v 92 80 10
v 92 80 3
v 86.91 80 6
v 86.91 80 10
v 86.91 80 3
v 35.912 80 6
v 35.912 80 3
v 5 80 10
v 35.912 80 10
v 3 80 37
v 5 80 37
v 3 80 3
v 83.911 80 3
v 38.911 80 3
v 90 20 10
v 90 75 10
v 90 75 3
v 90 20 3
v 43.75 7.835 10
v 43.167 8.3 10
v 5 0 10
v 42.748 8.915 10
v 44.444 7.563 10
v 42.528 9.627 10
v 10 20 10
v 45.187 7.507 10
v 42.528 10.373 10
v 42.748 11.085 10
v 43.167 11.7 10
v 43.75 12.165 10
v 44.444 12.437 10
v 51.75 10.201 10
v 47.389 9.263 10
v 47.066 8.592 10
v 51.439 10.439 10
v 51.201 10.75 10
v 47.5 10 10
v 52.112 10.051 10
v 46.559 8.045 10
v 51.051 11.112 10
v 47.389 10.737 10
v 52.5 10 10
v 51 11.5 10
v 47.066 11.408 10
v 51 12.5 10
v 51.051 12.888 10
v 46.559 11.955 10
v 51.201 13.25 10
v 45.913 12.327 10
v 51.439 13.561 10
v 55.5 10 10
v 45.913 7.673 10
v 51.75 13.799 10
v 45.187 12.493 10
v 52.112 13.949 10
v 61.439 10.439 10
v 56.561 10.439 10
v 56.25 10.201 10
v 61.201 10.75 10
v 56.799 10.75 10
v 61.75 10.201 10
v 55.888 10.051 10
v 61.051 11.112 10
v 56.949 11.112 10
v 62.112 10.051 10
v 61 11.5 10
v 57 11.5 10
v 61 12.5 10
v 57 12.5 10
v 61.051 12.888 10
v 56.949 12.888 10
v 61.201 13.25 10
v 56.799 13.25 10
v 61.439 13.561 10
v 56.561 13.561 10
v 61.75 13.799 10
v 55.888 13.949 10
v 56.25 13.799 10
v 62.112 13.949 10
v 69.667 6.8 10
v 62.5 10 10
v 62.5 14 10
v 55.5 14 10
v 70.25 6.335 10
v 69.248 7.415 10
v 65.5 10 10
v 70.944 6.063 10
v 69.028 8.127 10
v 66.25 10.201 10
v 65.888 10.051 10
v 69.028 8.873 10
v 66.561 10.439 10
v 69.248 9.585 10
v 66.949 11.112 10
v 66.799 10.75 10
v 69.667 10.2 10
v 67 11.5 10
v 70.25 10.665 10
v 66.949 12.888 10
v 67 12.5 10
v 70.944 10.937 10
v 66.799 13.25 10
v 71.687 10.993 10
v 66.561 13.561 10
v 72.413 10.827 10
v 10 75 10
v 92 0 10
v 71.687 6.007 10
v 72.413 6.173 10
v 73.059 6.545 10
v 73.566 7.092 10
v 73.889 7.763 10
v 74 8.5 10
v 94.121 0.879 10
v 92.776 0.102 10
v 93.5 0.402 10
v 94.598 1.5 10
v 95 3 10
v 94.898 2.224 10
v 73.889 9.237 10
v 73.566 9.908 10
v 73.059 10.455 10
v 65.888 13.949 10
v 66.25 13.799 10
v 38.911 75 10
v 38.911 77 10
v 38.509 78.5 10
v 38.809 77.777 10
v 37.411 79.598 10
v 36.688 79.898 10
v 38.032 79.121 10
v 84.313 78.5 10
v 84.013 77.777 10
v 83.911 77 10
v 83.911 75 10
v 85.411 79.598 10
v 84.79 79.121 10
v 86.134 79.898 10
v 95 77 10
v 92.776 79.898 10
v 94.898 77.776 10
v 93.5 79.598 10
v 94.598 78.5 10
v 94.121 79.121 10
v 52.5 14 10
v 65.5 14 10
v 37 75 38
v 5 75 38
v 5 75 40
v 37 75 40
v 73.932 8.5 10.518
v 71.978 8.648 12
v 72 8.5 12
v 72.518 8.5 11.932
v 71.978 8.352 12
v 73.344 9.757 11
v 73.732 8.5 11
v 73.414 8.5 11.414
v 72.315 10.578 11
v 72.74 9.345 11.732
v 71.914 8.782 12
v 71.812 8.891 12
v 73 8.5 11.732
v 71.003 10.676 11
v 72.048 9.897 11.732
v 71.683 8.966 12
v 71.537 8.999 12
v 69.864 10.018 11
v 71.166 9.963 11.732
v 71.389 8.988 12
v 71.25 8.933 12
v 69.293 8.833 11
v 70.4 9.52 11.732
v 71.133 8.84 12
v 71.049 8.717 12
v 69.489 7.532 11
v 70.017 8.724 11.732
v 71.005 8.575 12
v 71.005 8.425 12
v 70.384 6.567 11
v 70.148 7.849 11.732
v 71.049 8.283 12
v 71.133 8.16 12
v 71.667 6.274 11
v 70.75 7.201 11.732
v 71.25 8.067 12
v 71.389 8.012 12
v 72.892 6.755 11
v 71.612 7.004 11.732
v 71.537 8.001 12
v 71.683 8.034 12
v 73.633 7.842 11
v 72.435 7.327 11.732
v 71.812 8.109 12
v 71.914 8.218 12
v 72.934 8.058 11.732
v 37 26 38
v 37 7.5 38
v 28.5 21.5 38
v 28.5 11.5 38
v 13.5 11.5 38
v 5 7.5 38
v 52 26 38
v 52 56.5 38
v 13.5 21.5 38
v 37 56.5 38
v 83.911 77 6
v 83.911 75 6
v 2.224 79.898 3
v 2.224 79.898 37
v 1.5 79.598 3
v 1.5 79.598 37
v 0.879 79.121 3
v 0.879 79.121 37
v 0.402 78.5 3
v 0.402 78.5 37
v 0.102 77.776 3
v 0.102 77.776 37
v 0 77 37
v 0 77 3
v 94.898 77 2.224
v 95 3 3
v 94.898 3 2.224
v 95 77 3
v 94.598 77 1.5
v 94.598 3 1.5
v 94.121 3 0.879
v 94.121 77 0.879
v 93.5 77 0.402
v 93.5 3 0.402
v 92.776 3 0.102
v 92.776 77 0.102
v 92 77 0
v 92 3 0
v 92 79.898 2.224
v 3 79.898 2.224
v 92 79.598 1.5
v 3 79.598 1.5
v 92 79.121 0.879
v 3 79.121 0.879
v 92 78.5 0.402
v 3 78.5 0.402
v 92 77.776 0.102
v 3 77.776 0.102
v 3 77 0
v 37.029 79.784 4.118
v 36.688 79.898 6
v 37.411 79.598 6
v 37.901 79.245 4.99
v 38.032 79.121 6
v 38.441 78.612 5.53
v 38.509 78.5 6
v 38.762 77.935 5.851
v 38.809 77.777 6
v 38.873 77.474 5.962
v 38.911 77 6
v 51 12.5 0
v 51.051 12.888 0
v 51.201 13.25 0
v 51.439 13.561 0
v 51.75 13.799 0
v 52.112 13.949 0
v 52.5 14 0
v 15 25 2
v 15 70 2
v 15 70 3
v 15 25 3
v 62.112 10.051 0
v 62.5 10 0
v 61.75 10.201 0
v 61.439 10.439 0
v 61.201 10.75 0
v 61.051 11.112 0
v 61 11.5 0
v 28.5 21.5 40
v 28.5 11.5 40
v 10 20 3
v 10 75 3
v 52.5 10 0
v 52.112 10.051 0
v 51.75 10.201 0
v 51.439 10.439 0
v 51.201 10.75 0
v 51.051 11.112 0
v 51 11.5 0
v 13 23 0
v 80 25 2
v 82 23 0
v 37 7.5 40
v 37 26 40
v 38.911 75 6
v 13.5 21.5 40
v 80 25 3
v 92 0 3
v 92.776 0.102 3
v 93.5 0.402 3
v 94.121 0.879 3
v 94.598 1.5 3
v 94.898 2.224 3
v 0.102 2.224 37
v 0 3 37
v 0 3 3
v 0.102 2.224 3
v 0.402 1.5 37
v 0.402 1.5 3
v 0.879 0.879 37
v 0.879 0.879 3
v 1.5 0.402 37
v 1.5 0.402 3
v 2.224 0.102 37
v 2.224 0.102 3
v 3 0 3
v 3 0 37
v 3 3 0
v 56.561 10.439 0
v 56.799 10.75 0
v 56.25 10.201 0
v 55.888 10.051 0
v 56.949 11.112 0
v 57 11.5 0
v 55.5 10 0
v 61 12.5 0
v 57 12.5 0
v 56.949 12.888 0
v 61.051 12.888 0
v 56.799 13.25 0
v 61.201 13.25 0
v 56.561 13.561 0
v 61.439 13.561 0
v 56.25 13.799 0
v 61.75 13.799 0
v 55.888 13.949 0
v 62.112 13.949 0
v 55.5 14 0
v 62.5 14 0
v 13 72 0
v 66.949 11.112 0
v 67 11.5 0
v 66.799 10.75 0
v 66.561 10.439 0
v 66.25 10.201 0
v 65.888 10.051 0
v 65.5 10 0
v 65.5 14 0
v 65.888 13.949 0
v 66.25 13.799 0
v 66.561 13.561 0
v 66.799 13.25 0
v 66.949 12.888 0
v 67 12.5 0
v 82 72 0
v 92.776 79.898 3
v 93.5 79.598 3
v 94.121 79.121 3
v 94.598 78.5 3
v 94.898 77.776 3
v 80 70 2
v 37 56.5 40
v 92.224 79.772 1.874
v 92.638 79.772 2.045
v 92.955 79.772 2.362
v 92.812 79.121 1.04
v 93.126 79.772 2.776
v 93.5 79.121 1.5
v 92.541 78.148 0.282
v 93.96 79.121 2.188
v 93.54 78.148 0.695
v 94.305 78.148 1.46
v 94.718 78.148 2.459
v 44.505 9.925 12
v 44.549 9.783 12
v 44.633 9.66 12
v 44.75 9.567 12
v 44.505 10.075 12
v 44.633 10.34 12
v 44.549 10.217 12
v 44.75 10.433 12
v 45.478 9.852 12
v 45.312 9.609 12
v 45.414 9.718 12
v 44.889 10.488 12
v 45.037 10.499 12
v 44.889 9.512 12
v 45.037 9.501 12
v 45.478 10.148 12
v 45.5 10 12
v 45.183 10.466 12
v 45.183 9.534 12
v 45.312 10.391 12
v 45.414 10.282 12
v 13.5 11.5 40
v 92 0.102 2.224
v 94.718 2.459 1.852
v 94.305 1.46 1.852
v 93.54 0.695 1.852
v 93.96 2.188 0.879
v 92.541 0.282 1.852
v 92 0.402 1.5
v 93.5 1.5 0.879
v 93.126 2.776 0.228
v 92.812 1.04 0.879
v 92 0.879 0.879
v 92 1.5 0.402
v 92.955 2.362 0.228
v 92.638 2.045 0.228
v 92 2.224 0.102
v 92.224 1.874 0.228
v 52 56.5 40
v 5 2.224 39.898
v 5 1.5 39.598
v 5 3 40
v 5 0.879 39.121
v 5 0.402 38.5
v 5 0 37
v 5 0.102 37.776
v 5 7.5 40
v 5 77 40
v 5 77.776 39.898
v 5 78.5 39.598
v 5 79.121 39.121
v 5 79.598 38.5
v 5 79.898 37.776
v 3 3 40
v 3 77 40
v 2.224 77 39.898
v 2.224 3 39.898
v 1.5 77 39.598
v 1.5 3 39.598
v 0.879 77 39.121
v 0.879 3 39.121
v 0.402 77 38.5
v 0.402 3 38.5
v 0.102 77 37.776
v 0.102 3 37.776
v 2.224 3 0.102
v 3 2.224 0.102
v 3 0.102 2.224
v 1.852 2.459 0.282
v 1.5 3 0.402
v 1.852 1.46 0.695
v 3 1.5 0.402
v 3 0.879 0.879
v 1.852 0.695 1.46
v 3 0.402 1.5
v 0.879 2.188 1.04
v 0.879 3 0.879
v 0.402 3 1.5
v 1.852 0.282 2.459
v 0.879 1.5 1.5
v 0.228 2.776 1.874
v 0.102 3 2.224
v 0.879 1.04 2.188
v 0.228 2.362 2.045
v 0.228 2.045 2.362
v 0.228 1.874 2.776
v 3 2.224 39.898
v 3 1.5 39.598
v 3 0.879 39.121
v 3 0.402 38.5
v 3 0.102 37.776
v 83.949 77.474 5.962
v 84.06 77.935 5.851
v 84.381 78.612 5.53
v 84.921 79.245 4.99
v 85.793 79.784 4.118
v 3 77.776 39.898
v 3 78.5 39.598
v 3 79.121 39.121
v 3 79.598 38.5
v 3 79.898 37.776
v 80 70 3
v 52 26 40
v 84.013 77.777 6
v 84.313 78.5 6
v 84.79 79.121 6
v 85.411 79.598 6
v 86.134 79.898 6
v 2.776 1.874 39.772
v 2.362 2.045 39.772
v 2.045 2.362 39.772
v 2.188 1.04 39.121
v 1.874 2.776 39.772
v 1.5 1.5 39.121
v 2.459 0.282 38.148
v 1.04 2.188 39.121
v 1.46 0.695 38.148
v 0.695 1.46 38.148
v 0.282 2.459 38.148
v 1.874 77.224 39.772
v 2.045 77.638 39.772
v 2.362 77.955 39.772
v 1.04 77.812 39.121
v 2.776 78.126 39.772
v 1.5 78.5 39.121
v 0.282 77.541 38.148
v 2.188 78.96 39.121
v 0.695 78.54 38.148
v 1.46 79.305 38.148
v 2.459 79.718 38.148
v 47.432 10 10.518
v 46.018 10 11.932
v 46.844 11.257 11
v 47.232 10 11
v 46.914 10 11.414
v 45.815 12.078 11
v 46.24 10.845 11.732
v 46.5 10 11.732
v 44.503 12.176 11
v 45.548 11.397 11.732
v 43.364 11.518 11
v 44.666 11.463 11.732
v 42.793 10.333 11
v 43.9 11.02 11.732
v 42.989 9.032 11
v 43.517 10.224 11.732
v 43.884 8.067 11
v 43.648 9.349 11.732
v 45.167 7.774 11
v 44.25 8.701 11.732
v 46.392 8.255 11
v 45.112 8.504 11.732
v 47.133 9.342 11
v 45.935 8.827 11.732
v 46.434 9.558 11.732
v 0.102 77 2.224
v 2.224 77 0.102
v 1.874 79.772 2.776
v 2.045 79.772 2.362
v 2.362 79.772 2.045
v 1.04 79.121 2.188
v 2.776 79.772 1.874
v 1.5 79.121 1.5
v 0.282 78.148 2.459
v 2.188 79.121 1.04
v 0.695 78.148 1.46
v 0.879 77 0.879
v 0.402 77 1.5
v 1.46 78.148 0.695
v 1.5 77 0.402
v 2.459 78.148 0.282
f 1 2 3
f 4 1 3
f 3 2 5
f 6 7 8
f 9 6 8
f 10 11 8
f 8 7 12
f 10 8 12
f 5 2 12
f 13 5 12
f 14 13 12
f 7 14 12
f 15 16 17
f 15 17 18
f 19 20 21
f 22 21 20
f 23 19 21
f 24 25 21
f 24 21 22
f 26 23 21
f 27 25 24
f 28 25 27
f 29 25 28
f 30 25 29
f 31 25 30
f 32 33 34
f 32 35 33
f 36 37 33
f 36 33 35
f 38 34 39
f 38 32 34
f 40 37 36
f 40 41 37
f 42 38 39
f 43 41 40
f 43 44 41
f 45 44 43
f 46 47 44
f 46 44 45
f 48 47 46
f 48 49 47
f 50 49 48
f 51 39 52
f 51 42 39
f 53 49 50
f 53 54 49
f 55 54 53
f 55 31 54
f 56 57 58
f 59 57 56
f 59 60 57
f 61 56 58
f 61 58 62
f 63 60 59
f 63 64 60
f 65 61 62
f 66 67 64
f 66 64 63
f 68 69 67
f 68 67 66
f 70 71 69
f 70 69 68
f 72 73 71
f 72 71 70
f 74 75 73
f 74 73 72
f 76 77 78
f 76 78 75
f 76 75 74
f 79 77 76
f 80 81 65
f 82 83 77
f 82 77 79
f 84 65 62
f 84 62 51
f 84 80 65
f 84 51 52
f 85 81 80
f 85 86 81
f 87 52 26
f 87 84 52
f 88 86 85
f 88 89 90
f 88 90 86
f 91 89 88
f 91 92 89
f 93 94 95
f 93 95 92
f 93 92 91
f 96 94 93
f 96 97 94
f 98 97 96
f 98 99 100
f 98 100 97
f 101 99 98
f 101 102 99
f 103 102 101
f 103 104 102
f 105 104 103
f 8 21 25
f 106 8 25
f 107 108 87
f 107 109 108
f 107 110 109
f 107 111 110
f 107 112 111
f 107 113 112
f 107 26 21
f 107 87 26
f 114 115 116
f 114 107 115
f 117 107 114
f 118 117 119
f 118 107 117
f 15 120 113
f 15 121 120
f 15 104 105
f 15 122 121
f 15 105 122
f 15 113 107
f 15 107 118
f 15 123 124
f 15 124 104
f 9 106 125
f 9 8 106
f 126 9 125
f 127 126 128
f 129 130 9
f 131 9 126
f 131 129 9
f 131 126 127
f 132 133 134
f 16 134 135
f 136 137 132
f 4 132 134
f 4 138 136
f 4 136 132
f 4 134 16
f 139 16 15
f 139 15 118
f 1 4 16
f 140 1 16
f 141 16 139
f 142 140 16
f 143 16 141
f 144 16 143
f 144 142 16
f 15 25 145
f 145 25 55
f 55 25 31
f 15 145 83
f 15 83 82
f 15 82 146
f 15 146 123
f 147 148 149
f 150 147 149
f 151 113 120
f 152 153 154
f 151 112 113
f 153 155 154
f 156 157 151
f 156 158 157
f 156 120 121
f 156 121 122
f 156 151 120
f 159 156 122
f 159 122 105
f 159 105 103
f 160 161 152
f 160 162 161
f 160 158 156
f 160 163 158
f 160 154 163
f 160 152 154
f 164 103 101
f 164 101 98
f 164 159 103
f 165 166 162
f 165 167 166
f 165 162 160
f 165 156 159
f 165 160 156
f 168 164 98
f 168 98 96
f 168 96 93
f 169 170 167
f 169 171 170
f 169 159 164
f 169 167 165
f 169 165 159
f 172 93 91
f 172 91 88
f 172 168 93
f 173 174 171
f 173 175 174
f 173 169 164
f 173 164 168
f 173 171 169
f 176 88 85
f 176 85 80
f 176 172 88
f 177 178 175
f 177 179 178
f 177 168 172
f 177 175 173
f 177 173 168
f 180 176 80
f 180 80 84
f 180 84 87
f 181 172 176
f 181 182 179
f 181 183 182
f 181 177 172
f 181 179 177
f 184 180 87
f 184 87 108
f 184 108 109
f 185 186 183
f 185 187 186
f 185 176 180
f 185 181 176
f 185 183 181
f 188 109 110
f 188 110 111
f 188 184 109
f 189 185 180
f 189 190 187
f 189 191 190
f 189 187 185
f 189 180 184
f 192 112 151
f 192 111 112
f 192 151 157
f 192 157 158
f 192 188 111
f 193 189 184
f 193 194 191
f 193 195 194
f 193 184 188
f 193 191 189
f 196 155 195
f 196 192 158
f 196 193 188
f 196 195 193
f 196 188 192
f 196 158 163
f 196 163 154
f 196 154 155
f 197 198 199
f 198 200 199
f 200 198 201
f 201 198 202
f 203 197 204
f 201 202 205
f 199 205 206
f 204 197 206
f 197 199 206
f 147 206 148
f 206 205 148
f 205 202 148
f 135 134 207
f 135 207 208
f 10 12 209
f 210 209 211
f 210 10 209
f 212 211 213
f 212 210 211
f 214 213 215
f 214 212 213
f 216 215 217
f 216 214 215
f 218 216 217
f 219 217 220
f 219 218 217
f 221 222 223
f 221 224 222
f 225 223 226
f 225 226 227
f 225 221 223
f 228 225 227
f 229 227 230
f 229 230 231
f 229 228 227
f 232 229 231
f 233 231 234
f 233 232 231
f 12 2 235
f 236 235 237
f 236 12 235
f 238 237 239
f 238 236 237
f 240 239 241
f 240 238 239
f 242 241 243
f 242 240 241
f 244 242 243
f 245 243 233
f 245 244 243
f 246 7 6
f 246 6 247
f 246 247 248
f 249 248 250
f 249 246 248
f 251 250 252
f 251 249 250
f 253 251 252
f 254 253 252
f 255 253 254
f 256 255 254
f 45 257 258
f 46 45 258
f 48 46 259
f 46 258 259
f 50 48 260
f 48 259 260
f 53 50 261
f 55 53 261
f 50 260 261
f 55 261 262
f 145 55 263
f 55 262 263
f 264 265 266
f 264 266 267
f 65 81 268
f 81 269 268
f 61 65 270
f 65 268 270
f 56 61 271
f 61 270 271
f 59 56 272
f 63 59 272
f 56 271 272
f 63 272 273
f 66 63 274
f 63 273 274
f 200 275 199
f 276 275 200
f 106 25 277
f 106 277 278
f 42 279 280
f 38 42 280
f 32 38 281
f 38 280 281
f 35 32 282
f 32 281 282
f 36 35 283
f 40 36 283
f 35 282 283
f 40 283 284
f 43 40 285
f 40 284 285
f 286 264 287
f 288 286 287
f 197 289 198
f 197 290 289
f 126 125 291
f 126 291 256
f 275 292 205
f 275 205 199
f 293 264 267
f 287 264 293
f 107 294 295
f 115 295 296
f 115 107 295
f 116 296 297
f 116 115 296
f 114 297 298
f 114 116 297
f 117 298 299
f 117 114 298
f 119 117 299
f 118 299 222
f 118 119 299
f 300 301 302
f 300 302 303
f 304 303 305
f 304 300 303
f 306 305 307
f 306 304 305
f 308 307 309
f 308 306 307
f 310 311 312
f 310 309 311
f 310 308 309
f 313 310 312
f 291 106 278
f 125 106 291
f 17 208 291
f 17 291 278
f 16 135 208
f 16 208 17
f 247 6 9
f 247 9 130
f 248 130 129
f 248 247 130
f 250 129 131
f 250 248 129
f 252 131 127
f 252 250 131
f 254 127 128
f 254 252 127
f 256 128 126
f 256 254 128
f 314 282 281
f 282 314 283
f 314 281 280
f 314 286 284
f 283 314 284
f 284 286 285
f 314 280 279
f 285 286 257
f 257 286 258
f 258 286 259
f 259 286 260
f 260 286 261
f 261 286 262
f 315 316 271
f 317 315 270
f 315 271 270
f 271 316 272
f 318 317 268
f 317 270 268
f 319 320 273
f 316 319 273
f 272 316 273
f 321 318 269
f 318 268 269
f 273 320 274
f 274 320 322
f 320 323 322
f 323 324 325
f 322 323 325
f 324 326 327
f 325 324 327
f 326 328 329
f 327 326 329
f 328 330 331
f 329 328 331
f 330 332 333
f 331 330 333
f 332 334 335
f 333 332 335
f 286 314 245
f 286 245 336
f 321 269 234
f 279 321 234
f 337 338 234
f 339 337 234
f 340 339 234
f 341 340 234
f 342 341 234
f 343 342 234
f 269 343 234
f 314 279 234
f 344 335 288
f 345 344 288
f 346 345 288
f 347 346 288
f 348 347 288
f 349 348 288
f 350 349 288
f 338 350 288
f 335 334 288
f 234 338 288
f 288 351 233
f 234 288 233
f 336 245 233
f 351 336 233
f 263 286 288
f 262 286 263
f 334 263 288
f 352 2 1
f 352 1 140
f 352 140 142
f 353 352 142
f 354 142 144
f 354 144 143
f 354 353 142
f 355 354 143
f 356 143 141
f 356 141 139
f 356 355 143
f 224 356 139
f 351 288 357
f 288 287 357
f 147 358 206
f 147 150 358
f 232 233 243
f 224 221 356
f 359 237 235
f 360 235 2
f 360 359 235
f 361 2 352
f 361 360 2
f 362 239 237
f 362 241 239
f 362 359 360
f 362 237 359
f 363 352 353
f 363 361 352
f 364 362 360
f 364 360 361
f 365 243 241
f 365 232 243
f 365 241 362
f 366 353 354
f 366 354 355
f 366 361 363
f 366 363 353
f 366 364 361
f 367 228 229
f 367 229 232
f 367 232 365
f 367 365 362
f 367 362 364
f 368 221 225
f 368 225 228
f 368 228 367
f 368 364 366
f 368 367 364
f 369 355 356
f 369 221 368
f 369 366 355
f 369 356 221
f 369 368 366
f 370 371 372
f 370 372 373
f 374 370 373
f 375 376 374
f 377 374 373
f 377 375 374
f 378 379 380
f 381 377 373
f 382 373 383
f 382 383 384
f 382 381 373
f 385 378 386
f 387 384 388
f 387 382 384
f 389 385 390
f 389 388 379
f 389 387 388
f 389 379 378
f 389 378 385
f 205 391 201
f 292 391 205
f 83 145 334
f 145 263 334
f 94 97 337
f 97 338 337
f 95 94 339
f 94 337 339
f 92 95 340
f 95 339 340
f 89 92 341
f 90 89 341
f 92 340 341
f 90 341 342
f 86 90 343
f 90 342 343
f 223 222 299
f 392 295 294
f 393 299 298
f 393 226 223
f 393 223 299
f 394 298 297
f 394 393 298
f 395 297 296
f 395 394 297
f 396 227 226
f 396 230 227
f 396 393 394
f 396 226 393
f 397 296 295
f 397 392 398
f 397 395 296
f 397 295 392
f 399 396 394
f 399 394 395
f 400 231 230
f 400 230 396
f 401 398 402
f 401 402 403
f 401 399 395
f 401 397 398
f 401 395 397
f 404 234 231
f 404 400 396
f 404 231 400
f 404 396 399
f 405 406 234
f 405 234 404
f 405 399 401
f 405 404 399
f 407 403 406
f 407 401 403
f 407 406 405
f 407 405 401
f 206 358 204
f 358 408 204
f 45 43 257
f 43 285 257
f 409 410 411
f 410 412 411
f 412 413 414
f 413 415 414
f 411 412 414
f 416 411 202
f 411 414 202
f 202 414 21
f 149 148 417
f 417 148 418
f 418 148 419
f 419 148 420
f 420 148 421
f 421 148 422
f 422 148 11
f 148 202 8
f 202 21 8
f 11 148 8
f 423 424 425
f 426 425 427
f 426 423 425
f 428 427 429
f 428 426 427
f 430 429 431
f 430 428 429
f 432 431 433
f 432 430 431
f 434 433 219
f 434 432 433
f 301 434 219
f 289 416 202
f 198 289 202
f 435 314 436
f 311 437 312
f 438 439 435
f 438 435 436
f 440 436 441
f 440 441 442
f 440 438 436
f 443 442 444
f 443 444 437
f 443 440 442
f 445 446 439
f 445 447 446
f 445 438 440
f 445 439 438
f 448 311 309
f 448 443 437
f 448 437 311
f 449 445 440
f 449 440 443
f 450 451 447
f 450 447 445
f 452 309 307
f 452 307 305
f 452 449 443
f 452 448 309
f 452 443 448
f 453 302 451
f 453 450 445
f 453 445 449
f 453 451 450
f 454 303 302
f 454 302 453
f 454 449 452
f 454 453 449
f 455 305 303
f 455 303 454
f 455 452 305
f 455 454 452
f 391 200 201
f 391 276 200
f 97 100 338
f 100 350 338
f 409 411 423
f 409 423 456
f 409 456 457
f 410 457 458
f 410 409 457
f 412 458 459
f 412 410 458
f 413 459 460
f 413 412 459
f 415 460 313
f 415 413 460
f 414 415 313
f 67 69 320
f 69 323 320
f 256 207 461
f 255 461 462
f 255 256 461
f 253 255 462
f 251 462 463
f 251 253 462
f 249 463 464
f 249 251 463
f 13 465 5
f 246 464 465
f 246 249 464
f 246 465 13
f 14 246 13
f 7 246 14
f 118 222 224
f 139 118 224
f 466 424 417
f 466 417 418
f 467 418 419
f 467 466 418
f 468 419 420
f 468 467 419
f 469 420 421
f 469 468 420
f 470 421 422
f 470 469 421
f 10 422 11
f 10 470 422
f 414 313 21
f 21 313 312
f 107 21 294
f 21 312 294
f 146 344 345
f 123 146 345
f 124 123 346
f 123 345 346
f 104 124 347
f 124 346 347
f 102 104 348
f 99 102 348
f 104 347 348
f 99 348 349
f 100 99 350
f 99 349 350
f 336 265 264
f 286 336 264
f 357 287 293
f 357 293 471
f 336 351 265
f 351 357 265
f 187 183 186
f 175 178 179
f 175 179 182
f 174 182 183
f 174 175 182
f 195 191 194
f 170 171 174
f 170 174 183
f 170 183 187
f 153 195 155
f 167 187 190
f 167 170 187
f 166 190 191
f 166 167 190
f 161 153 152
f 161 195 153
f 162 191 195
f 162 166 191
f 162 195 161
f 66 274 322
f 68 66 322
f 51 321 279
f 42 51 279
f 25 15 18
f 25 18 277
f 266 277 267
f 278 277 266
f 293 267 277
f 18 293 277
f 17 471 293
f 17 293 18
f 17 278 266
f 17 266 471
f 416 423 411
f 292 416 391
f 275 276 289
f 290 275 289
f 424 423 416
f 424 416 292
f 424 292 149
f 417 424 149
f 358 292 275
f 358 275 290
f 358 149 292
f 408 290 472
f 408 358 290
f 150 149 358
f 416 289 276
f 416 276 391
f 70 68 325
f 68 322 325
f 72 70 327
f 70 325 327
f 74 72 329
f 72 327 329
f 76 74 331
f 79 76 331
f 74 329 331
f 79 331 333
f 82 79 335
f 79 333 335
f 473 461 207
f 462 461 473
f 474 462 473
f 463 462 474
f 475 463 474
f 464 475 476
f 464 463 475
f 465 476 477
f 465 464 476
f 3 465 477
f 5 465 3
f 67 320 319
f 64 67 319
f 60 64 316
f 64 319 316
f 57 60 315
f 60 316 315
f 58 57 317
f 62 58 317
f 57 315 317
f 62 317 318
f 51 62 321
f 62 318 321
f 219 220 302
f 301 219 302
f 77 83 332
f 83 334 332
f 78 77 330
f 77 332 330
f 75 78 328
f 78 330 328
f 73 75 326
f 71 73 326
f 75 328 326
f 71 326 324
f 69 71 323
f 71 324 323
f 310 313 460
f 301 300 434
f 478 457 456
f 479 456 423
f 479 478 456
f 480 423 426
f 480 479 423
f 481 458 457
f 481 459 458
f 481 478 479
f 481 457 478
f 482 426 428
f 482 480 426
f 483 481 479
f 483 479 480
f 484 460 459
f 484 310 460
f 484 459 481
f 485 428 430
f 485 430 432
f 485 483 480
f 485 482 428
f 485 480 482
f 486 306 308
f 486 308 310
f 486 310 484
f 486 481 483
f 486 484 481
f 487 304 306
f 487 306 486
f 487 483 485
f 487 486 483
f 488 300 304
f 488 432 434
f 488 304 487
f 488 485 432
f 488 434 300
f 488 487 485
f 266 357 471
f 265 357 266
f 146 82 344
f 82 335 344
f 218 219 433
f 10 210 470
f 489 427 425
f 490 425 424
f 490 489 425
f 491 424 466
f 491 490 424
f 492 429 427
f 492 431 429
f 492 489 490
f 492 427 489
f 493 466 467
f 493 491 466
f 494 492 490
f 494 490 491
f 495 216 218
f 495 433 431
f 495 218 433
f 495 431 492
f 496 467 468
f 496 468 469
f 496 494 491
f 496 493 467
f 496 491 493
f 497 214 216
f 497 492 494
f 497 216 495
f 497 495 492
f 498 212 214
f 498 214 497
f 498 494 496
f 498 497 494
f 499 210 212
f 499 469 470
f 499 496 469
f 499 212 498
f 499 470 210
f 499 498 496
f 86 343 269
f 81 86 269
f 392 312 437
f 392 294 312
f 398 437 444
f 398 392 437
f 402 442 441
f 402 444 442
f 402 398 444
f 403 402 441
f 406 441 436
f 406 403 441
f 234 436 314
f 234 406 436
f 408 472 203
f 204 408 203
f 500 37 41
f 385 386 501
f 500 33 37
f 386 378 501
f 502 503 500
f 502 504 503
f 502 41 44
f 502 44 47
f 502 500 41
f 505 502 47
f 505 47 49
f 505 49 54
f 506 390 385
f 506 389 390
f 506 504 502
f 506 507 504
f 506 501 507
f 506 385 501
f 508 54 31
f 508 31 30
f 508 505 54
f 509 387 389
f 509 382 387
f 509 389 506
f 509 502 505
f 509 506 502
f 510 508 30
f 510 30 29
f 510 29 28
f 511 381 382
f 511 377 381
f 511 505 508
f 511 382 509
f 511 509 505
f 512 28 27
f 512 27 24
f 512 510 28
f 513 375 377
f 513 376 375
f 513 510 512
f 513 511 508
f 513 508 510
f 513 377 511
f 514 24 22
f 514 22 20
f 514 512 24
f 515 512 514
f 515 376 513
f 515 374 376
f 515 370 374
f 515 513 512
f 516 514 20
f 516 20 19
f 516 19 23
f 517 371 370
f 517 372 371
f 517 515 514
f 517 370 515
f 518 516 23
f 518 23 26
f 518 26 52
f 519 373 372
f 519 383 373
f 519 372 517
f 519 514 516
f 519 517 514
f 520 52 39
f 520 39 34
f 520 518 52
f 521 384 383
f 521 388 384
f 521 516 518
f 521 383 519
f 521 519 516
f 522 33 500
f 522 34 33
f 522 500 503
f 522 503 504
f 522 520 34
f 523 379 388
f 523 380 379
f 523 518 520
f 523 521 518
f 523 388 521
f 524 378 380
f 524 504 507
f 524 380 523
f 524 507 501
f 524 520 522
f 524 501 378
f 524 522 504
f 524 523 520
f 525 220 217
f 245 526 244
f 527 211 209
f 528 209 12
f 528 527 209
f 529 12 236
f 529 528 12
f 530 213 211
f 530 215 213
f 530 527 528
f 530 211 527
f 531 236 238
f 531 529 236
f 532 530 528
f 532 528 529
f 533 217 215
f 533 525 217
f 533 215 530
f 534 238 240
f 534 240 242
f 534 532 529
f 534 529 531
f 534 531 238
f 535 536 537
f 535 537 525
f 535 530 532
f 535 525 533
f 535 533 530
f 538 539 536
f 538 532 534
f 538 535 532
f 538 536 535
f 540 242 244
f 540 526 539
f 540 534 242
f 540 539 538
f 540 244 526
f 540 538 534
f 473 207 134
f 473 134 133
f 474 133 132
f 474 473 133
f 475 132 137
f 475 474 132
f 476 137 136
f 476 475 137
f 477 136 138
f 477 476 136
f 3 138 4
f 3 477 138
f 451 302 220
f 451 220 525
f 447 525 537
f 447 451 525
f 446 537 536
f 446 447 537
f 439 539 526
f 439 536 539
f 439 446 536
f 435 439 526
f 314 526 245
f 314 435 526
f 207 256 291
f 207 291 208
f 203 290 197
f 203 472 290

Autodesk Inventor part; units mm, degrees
ref_plane "YZ Plane" through (0, 0, 0) normal (1, 0, 0) x (0, 1, 0)
ref_plane "XZ Plane" through (0, 0, 0) normal (0, 1, 0) x (-1, 0, 0)
ref_plane "XY Plane" through (0, 0, 0) normal (0, 0, 1) x (1, 0, 0)
sketch "Sketch1" plane through (0, 0, 0) normal (0, 0, 1) x (1, 0, 0)
  line L0 (0, 0) -> (95, 0)
  line L1 (95, 0) -> (95, 80)
  line L2 (95, 80) -> (0, 80)
  line L3 (0, 80) -> (0, 0)
  dimension "d0" = 95
  dimension "d1" = 80
extrude "Extrusion1" add sketch "Sketch1" along normal blind 10
sketch "Sketch2" plane through (0, 0, 10) normal (0, 0, 1) x (1, 0, 0)
  line L0 (0, 0) -> (5, 0)
  line L1 (5, 0) -> (5, 80)
  line L2 (5, 80) -> (0, 80)
  line L3 (0, 80) -> (0, 0)
  dimension "d4" = 5
  dimension "d5" = 80
extrude "Extrusion2" add sketch "Sketch2" along normal blind 30
sketch "Sketch3" plane through (5, 0, 10) normal (1, 0, 0) x (0, 0, -1)
  line L0 (-30, 80) -> (-30, 0) projected
  line L1 (-30, 7.5) -> (-28, 7.5)
  line L2 (-28, 7.5) -> (-28, 75)
  line L3 (-28, 75) -> (-30, 75)
  line L4 (-30, 75) -> (-30, 7.5)
  point P0 (10, 0)
  dimension "d8" = 2
  dimension "d9" = 67.5
extrude "Extrusion3" add sketch "Sketch3" along normal blind 47
sketch "Sketch4" plane through (52, 0, 10) normal (1, 0, 0) x (0, 0, -1)
  line L0 (-28, 75) -> (-28, 7.5) projected
  line L1 (-28, 75) -> (-30, 75)
  line L2 (-30, 75) -> (-30, 56.5)
  line L3 (-30, 56.5) -> (-28, 56.5)
  line L4 (-28, 56.5) -> (-28, 75)
  line L5 (-28, 7.5) -> (-30, 7.5)
  line L6 (-30, 7.5) -> (-30, 26)
  line L7 (-30, 26) -> (-28, 26)
  line L8 (-28, 26) -> (-28, 7.5)
  point P0 (10, 0)
  dimension "d12" = 2
  dimension "d13" = 18.5
  dimension "d14" = 2
  dimension "d15" = 18.5
extrude "Extrusion4" cut sketch "Sketch4" against normal blind 15
sketch "Sketch5" plane through (0, 0, 40) normal (0, 0, 1) x (1, 0, 0)
  line L0 (28.5, 11.5) -> (13.5, 11.5)
  line L1 (13.5, 11.5) -> (13.5, 21.5)
  line L2 (13.5, 21.5) -> (28.5, 21.5)
  line L3 (28.5, 21.5) -> (28.5, 11.5)
  point P0 (0, 0)
  dimension "d18" = 15
  dimension "d19" = 10
extrude "Extrusion5" cut sketch "Sketch5" against normal blind 2
sketch "Sketch6" plane through (0, 0, 0) normal (0, 0, -1) x (-1, 0, 0)
  line L0 (-80, 70) -> (-15, 70)
  line L1 (-15, 70) -> (-15, 25)
  line L2 (-15, 25) -> (-80, 25)
  line L3 (-80, 25) -> (-80, 70)
  line L4 (0, 80) -> (0, 0) projected
  line L5 (-95, 80) -> (0, 80) projected
  dimension "d22" = 65
  dimension "d23" = 45
  dimension "d24" = 15
  dimension "d25" = 10
extrude "Extrusion6" cut sketch "Sketch6" against normal blind 10
sketch "Sketch7" plane through (0, 0, 0) normal (0, 0, -1) x (-1, 0, 0)
  point P0 (0, 0)
sketch "Sketch8" plane through (0, 0, 10) normal (0, 0, 1) x (1, 0, 0)
  line L0 (90, 20) -> (10, 20)
  line L1 (10, 20) -> (10, 75)
  line L2 (10, 75) -> (90, 75)
  line L3 (90, 75) -> (90, 20)
  point P0 (0, 0)
  dimension "d28" = 80
  dimension "d29" = 55
extrude "Extrusion7" cut sketch "Sketch8" against normal blind 7
sketch "Sketch9" plane through (0, 0, 10) normal (0, 0, 1) x (1, 0, 0)
  circle A0 centre (45, 10) radius 2.5
  line L0 (0, 0) -> (95, 0) projected
  line L1 (5, 80) -> (5, 0) projected
  dimension "d32" = 5
  dimension "d36" = 10
  dimension "d41" = 40
extrude "Extrusion8" add sketch "Sketch9" along normal blind 2
fillet "Fillet1" radius 2 1 edges at (42.5, 10, 12)
sketch "Sketch10" plane through (0, 0, 10) normal (0, 0, 1) x (1, 0, 0)
  circle A0 centre (71.5, 8.5) radius 2.5
  point P0 (0, 0)
  dimension "d37" = 5
extrude "Extrusion9" add sketch "Sketch10" along normal blind 2
fillet "Fillet2" radius 2 1 edges at (69, 8.5, 12)
fillet "Fillet3" radius 3 1 edges at (95, 0, 5)
fillet "Fillet4" radius 3 3 edges at (46, 0, 0) (94.1213, 0.8787, 0) (95, 41.5, 0)
fillet "Fillet5" radius 3 3 edges at (0, 41.5, 0) (0, 0.8787, 0.8787) (0, 0, 21.5)
fillet "Fillet6" radius 3 5 edges at (47.5, 80, 0) (0.8787, 80, 0.8787) (0, 80, 21.5) (94.1213, 80, 0.8787) (95, 80, 6.5)
fillet "Fillet7" radius 3 5 edges at (0, 40, 40) (0.8787, 0.8787, 40) (4, 0, 40) (0.8787, 79.1213, 40) (4, 80, 40)
chamfer "Chamfer1" distance 2 angle 45 1 edges at (47.5, 25, 0)
chamfer "Chamfer2" distance 2 angle 45 1 edges at (15, 47.5, 0)
chamfer "Chamfer3" distance 2 angle 45 1 edges at (80, 47.5, 0)
sketch "Sketch11" plane through (0, 0, 0) normal (0, 0, -1) x (-1, 0, 0)
  line L0 (-65.5, 10) -> (-62.5, 10)
  line L1 (-61, 11.5) -> (-61, 12.5)
  line L2 (-62.5, 14) -> (-65.5, 14)
  line L3 (-67, 12.5) -> (-67, 11.5)
  line L4 (-55.5, 10) -> (-52.5, 10)
  line L5 (-51, 11.5) -> (-51, 12.5)
  line L6 (-52.5, 14) -> (-55.5, 14)
  line L7 (-57, 12.5) -> (-57, 11.5)
  arc A0 (-51, 12.5) -> (-52.5, 14) centre (-52.5, 12.5) ccw
  arc A1 (-52.5, 10) -> (-51, 11.5) centre (-52.5, 11.5) ccw
  arc A2 (-57, 11.5) -> (-55.5, 10) centre (-55.5, 11.5) ccw
  arc A3 (-55.5, 14) -> (-57, 12.5) centre (-55.5, 12.5) ccw
  arc A4 (-61, 12.5) -> (-62.5, 14) centre (-62.5, 12.5) ccw
  arc A5 (-62.5, 10) -> (-61, 11.5) centre (-62.5, 11.5) ccw
  arc A6 (-67, 11.5) -> (-65.5, 10) centre (-65.5, 11.5) ccw
  arc A7 (-65.5, 14) -> (-67, 12.5) centre (-65.5, 12.5) ccw
  point P0 (0, 0)
  point P1 (-67, 10)
  point P2 (-61, 14)
  point P3 (-61, 10)
  point P4 (-67, 14)
  point P5 (-57, 10)
  point P6 (-51, 14)
  point P7 (-51, 10)
  point P8 (-57, 14)
  dimension "d56" = 6
  dimension "d57" = 4
  dimension "d60" = 1.5
extrude "Extrusion10" cut sketch "Sketch11" against normal blind 10
chamfer "Chamfer4" distance 2 angle 45 1 edges at (47.5, 70, 0)
sketch "Sketch12" plane through (0, 0, 10) normal (0, 0, 1) x (1, 0, 0)
  line L0 (92, 80) -> (5, 80) projected
  line L1 (10, 75) -> (90, 75) projected
  line L2 (38.911, 80) -> (83.911, 80)
  line L3 (83.911, 80) -> (83.911, 75)
  line L4 (83.911, 75) -> (38.911, 75)
  line L5 (38.911, 75) -> (38.911, 80)
  point P0 (0, 0)
  dimension "d64" = 45
extrude "Extrusion11" cut sketch "Sketch12" against normal blind 4
fillet "Fillet8" radius 3 1 edges at (61.411, 80, 6)
fillet "Fillet9" radius 3 2 edges at (83.911, 80, 4.5003) (83.911, 80, 8)
fillet "Fillet10" radius 3 2 edges at (38.911, 80, 4.5003) (38.911, 80, 8)
properties part number "case top"
